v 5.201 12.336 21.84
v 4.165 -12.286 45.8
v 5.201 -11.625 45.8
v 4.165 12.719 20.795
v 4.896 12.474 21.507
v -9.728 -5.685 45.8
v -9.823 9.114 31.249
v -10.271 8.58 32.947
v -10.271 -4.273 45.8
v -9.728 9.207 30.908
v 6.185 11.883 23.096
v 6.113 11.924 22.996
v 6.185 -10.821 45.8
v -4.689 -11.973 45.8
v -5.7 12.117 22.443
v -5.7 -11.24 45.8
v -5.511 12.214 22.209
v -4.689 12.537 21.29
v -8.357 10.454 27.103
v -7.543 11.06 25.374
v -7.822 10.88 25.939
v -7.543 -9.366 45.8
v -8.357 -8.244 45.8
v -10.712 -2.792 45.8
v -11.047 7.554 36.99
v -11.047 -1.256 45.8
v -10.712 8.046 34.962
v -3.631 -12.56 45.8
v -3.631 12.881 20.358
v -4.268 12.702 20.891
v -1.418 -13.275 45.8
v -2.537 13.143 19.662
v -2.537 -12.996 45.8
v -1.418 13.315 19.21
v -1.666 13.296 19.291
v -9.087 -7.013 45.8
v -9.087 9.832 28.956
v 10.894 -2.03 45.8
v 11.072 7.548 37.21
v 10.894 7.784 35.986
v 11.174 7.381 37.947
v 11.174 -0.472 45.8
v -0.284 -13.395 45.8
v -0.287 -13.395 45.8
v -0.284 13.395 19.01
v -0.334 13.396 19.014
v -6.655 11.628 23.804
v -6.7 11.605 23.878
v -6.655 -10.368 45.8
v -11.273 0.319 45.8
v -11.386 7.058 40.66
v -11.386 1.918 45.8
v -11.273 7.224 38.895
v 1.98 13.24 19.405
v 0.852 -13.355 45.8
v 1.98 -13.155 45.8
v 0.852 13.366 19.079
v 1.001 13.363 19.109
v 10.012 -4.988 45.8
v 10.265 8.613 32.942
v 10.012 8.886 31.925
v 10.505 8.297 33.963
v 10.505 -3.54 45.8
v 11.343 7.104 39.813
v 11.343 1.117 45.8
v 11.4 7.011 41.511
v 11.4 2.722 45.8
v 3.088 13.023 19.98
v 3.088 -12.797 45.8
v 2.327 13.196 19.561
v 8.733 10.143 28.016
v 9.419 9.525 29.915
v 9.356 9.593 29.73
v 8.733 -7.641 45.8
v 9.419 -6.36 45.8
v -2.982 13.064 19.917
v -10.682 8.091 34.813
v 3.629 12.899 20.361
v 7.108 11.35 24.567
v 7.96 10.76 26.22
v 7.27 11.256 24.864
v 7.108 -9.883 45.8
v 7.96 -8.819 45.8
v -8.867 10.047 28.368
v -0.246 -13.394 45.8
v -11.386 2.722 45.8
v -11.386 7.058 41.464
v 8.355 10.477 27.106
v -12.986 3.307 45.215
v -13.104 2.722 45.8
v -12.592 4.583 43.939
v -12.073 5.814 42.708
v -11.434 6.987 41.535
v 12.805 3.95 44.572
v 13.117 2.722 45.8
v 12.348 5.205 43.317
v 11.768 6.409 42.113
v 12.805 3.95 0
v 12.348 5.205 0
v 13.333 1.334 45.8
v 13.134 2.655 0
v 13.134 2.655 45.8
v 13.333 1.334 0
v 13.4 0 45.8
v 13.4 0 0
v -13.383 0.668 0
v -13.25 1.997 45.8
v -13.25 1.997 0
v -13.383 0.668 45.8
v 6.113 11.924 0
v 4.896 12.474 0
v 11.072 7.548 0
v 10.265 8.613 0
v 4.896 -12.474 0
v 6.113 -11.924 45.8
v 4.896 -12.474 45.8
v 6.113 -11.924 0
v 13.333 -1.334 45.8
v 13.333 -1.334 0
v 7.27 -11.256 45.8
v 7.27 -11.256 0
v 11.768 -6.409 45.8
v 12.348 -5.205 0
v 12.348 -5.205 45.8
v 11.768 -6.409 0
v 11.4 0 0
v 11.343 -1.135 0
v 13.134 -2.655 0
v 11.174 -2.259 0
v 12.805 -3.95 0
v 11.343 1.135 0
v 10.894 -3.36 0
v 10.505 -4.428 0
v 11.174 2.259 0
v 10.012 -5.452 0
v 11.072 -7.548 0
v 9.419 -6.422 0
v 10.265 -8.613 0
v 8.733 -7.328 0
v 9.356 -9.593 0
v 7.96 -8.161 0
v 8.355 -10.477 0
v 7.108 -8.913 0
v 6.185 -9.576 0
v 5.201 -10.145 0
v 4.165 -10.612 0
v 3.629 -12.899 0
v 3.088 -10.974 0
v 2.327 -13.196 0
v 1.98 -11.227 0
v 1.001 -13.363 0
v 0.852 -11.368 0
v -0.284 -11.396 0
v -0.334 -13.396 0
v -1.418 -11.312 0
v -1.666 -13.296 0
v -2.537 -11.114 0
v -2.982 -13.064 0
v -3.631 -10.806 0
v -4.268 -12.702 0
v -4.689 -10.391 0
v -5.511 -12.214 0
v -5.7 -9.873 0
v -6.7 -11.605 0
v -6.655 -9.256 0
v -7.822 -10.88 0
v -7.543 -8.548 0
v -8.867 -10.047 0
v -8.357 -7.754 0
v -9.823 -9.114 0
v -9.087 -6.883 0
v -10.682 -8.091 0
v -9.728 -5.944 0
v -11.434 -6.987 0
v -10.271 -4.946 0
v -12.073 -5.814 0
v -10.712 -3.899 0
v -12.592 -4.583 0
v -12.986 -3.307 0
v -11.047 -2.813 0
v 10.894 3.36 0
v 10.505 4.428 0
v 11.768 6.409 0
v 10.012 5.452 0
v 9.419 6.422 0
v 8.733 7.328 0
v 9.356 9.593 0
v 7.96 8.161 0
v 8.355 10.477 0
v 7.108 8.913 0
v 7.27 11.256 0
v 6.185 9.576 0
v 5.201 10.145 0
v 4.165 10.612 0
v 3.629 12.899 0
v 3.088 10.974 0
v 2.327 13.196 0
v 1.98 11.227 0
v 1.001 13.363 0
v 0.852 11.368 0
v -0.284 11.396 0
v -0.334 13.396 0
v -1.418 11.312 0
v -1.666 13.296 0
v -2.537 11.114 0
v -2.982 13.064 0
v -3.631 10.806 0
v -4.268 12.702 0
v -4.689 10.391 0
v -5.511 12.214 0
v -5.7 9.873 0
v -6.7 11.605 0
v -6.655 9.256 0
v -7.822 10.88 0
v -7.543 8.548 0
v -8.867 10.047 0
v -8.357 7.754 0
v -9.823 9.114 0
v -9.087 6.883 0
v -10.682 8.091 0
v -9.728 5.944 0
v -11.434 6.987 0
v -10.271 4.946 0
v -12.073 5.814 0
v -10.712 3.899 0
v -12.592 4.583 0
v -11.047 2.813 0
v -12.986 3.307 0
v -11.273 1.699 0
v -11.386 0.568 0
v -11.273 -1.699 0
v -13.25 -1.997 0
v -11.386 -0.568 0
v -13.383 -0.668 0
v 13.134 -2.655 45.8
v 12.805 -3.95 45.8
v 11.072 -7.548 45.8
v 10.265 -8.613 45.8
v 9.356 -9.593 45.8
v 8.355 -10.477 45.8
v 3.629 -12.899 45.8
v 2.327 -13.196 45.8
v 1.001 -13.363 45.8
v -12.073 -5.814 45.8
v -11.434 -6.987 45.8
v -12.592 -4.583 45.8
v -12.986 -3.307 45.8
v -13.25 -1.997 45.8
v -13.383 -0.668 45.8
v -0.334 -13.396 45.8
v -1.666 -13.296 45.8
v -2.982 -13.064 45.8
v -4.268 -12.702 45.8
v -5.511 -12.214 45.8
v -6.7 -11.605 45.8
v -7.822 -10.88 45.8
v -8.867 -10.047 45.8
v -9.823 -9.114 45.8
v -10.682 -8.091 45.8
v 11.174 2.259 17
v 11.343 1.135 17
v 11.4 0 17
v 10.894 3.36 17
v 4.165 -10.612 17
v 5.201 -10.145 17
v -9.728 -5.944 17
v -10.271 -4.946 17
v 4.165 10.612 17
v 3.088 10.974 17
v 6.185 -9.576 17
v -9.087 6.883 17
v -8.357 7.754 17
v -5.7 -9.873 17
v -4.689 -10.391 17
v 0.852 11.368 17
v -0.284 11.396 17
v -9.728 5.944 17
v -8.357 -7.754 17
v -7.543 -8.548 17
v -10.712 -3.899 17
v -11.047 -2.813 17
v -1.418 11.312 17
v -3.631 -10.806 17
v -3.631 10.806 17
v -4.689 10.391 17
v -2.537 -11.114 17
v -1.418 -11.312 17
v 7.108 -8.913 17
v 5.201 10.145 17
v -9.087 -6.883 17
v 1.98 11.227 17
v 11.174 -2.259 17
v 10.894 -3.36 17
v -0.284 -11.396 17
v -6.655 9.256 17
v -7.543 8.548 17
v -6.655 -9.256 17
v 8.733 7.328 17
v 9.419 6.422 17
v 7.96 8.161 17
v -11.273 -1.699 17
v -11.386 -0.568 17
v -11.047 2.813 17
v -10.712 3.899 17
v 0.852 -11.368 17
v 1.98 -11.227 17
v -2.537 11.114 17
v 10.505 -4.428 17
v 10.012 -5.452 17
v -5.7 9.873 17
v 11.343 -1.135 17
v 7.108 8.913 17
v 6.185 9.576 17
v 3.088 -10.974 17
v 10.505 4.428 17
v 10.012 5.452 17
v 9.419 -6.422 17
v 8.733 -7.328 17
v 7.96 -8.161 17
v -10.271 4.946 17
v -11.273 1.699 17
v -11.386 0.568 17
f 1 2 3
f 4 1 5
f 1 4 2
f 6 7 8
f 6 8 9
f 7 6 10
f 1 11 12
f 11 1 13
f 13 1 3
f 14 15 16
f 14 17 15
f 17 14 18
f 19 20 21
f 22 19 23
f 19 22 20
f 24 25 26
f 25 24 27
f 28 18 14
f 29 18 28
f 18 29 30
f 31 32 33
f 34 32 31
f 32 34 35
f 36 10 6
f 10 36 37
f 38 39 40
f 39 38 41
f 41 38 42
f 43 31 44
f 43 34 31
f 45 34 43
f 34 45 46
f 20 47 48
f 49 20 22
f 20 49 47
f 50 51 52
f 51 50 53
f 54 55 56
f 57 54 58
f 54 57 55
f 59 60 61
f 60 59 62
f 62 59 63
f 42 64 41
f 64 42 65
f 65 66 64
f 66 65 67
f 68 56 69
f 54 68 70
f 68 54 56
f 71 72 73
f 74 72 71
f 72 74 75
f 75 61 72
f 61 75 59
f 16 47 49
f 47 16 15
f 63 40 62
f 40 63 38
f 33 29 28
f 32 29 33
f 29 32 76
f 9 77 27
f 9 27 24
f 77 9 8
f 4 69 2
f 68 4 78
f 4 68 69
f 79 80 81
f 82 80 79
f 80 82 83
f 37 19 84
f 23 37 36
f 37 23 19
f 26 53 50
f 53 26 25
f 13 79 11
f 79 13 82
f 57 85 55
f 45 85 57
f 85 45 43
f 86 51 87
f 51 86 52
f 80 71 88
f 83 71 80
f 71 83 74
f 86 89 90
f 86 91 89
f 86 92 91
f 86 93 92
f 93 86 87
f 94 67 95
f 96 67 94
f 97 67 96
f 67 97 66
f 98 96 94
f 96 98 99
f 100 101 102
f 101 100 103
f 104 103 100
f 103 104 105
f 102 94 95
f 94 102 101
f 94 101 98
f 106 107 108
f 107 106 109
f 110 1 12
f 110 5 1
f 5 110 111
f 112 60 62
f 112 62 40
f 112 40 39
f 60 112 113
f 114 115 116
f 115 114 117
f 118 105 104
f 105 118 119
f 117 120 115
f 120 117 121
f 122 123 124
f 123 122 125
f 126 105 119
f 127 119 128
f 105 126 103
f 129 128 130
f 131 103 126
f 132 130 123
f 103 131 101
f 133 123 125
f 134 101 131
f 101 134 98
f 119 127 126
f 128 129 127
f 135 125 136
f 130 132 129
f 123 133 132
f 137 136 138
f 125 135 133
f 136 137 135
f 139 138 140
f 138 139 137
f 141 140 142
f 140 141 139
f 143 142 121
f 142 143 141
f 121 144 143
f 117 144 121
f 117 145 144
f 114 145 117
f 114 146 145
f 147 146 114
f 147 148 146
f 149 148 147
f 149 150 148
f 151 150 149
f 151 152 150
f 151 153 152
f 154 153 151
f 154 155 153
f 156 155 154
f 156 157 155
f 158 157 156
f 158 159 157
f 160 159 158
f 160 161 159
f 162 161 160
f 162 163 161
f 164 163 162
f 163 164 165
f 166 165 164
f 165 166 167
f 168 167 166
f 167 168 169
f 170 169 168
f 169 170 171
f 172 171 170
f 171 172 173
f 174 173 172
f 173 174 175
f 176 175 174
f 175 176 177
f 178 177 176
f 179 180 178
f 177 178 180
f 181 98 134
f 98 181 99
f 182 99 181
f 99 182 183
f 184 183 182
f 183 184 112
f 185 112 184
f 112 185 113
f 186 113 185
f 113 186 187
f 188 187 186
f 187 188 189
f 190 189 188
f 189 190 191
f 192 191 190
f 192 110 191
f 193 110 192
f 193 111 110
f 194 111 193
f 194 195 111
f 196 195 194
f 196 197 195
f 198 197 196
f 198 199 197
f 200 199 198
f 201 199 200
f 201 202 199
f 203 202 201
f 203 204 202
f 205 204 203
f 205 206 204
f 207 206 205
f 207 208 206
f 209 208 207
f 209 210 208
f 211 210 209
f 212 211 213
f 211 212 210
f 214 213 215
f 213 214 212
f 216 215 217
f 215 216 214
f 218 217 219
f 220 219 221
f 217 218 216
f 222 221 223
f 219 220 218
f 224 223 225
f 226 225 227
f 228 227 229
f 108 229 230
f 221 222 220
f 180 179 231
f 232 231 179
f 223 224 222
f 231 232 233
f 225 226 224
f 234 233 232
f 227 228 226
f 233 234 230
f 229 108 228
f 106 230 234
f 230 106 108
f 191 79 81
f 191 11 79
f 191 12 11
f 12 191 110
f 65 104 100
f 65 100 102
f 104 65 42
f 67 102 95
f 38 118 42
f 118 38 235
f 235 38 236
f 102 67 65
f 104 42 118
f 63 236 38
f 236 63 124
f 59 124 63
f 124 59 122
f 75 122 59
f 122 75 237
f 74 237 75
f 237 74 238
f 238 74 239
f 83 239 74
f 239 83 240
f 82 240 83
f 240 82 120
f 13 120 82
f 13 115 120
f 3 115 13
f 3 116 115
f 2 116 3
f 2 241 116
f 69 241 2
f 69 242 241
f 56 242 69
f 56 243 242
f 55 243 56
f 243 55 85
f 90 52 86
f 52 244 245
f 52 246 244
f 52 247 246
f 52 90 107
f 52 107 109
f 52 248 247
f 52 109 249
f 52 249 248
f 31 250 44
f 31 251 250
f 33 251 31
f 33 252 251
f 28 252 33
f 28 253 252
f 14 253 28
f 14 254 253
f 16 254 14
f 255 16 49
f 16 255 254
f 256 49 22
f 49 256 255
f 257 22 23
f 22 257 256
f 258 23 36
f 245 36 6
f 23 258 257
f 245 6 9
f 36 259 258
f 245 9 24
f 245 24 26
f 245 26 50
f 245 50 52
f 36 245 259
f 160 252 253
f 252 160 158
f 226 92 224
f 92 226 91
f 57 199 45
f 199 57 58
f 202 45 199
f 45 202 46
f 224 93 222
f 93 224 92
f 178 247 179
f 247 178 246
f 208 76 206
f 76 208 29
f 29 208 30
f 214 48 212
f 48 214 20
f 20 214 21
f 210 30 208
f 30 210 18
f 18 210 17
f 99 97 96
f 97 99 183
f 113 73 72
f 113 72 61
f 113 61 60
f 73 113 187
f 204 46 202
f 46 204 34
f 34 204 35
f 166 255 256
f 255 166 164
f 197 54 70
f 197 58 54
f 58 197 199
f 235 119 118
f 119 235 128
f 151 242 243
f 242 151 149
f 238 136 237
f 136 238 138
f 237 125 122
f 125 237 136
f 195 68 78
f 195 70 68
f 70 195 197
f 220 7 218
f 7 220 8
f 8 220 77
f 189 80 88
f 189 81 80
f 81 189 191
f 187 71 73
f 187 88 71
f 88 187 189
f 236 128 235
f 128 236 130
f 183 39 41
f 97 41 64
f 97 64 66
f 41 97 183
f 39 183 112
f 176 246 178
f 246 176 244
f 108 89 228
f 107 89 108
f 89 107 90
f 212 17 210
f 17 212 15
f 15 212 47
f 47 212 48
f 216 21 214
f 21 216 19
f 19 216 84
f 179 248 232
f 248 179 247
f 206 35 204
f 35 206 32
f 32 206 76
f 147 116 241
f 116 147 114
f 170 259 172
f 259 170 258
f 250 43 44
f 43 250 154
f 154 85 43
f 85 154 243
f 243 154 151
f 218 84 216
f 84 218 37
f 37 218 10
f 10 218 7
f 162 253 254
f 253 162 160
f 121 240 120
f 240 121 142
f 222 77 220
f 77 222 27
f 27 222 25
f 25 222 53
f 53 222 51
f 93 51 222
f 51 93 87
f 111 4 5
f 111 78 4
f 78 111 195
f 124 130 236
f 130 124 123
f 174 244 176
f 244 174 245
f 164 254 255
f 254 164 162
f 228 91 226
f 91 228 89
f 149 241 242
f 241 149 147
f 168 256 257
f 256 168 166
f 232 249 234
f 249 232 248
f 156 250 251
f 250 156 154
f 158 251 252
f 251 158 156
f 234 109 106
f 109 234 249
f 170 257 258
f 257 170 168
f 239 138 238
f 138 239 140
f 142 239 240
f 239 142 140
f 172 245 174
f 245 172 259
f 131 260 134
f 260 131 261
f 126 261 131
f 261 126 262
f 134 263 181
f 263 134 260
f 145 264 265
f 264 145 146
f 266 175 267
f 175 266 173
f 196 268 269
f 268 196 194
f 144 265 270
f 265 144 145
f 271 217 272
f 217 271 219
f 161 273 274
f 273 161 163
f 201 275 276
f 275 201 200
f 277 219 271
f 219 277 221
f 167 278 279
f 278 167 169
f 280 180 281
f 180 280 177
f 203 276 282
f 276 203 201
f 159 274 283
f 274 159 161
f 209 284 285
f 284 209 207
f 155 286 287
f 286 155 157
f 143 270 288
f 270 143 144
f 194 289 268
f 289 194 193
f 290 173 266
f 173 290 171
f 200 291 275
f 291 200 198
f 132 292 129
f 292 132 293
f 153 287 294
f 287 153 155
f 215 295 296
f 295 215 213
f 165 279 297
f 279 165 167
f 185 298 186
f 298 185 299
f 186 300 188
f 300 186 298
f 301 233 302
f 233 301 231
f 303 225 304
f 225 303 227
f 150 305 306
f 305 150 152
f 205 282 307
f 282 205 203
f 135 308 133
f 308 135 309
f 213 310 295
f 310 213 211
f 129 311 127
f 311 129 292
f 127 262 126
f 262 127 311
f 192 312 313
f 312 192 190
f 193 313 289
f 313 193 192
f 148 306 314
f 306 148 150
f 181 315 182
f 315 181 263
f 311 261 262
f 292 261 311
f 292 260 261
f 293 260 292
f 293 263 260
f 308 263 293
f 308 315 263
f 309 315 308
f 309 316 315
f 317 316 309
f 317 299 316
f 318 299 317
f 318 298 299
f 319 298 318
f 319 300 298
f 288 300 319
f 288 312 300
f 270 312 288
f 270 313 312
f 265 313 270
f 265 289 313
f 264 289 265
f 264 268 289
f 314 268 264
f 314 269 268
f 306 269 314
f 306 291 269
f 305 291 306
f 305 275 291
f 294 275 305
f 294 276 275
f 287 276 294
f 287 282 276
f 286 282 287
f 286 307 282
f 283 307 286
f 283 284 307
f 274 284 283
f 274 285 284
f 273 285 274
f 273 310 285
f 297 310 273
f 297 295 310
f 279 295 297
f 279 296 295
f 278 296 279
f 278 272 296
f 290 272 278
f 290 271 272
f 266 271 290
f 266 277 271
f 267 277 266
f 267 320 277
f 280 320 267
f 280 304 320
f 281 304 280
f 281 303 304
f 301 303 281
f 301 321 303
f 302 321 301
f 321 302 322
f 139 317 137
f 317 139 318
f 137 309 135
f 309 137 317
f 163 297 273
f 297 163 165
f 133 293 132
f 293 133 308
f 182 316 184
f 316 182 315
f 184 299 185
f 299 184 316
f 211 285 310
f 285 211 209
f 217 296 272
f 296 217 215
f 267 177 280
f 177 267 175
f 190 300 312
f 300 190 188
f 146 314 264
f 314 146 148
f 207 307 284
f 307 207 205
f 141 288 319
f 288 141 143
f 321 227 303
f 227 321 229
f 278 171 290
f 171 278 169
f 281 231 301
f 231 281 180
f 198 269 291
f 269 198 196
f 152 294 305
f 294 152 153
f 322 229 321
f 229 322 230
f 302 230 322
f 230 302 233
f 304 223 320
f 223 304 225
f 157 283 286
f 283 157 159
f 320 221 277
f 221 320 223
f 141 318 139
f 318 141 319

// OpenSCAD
tubed = 22.8;
tubeh = 17;
wall  = 2;
//angle = 60;
angle = 45;

$fn = 63;

difference(){
    cylinder(h = tubeh + wall + (tubed+(2*wall))*tan(90-angle), d = tubed + (2*wall));
    cylinder(h = tubeh, d = tubed);

    translate([0,wall+(tubed/2),tubeh+wall]){
        rotate([angle,0,0]){
            translate([0,tubed/2,0]){
                cylinder(h = (tubed+(2*wall))/cos(90 - angle), d = tubed);
                translate([-(wall+(tubed/2)),0,0]){
                    cube([tubed+(2*wall), tubed/2, (tubed+(2*wall))/cos(90 - angle)]);
                }
            }
        }
    }
}
